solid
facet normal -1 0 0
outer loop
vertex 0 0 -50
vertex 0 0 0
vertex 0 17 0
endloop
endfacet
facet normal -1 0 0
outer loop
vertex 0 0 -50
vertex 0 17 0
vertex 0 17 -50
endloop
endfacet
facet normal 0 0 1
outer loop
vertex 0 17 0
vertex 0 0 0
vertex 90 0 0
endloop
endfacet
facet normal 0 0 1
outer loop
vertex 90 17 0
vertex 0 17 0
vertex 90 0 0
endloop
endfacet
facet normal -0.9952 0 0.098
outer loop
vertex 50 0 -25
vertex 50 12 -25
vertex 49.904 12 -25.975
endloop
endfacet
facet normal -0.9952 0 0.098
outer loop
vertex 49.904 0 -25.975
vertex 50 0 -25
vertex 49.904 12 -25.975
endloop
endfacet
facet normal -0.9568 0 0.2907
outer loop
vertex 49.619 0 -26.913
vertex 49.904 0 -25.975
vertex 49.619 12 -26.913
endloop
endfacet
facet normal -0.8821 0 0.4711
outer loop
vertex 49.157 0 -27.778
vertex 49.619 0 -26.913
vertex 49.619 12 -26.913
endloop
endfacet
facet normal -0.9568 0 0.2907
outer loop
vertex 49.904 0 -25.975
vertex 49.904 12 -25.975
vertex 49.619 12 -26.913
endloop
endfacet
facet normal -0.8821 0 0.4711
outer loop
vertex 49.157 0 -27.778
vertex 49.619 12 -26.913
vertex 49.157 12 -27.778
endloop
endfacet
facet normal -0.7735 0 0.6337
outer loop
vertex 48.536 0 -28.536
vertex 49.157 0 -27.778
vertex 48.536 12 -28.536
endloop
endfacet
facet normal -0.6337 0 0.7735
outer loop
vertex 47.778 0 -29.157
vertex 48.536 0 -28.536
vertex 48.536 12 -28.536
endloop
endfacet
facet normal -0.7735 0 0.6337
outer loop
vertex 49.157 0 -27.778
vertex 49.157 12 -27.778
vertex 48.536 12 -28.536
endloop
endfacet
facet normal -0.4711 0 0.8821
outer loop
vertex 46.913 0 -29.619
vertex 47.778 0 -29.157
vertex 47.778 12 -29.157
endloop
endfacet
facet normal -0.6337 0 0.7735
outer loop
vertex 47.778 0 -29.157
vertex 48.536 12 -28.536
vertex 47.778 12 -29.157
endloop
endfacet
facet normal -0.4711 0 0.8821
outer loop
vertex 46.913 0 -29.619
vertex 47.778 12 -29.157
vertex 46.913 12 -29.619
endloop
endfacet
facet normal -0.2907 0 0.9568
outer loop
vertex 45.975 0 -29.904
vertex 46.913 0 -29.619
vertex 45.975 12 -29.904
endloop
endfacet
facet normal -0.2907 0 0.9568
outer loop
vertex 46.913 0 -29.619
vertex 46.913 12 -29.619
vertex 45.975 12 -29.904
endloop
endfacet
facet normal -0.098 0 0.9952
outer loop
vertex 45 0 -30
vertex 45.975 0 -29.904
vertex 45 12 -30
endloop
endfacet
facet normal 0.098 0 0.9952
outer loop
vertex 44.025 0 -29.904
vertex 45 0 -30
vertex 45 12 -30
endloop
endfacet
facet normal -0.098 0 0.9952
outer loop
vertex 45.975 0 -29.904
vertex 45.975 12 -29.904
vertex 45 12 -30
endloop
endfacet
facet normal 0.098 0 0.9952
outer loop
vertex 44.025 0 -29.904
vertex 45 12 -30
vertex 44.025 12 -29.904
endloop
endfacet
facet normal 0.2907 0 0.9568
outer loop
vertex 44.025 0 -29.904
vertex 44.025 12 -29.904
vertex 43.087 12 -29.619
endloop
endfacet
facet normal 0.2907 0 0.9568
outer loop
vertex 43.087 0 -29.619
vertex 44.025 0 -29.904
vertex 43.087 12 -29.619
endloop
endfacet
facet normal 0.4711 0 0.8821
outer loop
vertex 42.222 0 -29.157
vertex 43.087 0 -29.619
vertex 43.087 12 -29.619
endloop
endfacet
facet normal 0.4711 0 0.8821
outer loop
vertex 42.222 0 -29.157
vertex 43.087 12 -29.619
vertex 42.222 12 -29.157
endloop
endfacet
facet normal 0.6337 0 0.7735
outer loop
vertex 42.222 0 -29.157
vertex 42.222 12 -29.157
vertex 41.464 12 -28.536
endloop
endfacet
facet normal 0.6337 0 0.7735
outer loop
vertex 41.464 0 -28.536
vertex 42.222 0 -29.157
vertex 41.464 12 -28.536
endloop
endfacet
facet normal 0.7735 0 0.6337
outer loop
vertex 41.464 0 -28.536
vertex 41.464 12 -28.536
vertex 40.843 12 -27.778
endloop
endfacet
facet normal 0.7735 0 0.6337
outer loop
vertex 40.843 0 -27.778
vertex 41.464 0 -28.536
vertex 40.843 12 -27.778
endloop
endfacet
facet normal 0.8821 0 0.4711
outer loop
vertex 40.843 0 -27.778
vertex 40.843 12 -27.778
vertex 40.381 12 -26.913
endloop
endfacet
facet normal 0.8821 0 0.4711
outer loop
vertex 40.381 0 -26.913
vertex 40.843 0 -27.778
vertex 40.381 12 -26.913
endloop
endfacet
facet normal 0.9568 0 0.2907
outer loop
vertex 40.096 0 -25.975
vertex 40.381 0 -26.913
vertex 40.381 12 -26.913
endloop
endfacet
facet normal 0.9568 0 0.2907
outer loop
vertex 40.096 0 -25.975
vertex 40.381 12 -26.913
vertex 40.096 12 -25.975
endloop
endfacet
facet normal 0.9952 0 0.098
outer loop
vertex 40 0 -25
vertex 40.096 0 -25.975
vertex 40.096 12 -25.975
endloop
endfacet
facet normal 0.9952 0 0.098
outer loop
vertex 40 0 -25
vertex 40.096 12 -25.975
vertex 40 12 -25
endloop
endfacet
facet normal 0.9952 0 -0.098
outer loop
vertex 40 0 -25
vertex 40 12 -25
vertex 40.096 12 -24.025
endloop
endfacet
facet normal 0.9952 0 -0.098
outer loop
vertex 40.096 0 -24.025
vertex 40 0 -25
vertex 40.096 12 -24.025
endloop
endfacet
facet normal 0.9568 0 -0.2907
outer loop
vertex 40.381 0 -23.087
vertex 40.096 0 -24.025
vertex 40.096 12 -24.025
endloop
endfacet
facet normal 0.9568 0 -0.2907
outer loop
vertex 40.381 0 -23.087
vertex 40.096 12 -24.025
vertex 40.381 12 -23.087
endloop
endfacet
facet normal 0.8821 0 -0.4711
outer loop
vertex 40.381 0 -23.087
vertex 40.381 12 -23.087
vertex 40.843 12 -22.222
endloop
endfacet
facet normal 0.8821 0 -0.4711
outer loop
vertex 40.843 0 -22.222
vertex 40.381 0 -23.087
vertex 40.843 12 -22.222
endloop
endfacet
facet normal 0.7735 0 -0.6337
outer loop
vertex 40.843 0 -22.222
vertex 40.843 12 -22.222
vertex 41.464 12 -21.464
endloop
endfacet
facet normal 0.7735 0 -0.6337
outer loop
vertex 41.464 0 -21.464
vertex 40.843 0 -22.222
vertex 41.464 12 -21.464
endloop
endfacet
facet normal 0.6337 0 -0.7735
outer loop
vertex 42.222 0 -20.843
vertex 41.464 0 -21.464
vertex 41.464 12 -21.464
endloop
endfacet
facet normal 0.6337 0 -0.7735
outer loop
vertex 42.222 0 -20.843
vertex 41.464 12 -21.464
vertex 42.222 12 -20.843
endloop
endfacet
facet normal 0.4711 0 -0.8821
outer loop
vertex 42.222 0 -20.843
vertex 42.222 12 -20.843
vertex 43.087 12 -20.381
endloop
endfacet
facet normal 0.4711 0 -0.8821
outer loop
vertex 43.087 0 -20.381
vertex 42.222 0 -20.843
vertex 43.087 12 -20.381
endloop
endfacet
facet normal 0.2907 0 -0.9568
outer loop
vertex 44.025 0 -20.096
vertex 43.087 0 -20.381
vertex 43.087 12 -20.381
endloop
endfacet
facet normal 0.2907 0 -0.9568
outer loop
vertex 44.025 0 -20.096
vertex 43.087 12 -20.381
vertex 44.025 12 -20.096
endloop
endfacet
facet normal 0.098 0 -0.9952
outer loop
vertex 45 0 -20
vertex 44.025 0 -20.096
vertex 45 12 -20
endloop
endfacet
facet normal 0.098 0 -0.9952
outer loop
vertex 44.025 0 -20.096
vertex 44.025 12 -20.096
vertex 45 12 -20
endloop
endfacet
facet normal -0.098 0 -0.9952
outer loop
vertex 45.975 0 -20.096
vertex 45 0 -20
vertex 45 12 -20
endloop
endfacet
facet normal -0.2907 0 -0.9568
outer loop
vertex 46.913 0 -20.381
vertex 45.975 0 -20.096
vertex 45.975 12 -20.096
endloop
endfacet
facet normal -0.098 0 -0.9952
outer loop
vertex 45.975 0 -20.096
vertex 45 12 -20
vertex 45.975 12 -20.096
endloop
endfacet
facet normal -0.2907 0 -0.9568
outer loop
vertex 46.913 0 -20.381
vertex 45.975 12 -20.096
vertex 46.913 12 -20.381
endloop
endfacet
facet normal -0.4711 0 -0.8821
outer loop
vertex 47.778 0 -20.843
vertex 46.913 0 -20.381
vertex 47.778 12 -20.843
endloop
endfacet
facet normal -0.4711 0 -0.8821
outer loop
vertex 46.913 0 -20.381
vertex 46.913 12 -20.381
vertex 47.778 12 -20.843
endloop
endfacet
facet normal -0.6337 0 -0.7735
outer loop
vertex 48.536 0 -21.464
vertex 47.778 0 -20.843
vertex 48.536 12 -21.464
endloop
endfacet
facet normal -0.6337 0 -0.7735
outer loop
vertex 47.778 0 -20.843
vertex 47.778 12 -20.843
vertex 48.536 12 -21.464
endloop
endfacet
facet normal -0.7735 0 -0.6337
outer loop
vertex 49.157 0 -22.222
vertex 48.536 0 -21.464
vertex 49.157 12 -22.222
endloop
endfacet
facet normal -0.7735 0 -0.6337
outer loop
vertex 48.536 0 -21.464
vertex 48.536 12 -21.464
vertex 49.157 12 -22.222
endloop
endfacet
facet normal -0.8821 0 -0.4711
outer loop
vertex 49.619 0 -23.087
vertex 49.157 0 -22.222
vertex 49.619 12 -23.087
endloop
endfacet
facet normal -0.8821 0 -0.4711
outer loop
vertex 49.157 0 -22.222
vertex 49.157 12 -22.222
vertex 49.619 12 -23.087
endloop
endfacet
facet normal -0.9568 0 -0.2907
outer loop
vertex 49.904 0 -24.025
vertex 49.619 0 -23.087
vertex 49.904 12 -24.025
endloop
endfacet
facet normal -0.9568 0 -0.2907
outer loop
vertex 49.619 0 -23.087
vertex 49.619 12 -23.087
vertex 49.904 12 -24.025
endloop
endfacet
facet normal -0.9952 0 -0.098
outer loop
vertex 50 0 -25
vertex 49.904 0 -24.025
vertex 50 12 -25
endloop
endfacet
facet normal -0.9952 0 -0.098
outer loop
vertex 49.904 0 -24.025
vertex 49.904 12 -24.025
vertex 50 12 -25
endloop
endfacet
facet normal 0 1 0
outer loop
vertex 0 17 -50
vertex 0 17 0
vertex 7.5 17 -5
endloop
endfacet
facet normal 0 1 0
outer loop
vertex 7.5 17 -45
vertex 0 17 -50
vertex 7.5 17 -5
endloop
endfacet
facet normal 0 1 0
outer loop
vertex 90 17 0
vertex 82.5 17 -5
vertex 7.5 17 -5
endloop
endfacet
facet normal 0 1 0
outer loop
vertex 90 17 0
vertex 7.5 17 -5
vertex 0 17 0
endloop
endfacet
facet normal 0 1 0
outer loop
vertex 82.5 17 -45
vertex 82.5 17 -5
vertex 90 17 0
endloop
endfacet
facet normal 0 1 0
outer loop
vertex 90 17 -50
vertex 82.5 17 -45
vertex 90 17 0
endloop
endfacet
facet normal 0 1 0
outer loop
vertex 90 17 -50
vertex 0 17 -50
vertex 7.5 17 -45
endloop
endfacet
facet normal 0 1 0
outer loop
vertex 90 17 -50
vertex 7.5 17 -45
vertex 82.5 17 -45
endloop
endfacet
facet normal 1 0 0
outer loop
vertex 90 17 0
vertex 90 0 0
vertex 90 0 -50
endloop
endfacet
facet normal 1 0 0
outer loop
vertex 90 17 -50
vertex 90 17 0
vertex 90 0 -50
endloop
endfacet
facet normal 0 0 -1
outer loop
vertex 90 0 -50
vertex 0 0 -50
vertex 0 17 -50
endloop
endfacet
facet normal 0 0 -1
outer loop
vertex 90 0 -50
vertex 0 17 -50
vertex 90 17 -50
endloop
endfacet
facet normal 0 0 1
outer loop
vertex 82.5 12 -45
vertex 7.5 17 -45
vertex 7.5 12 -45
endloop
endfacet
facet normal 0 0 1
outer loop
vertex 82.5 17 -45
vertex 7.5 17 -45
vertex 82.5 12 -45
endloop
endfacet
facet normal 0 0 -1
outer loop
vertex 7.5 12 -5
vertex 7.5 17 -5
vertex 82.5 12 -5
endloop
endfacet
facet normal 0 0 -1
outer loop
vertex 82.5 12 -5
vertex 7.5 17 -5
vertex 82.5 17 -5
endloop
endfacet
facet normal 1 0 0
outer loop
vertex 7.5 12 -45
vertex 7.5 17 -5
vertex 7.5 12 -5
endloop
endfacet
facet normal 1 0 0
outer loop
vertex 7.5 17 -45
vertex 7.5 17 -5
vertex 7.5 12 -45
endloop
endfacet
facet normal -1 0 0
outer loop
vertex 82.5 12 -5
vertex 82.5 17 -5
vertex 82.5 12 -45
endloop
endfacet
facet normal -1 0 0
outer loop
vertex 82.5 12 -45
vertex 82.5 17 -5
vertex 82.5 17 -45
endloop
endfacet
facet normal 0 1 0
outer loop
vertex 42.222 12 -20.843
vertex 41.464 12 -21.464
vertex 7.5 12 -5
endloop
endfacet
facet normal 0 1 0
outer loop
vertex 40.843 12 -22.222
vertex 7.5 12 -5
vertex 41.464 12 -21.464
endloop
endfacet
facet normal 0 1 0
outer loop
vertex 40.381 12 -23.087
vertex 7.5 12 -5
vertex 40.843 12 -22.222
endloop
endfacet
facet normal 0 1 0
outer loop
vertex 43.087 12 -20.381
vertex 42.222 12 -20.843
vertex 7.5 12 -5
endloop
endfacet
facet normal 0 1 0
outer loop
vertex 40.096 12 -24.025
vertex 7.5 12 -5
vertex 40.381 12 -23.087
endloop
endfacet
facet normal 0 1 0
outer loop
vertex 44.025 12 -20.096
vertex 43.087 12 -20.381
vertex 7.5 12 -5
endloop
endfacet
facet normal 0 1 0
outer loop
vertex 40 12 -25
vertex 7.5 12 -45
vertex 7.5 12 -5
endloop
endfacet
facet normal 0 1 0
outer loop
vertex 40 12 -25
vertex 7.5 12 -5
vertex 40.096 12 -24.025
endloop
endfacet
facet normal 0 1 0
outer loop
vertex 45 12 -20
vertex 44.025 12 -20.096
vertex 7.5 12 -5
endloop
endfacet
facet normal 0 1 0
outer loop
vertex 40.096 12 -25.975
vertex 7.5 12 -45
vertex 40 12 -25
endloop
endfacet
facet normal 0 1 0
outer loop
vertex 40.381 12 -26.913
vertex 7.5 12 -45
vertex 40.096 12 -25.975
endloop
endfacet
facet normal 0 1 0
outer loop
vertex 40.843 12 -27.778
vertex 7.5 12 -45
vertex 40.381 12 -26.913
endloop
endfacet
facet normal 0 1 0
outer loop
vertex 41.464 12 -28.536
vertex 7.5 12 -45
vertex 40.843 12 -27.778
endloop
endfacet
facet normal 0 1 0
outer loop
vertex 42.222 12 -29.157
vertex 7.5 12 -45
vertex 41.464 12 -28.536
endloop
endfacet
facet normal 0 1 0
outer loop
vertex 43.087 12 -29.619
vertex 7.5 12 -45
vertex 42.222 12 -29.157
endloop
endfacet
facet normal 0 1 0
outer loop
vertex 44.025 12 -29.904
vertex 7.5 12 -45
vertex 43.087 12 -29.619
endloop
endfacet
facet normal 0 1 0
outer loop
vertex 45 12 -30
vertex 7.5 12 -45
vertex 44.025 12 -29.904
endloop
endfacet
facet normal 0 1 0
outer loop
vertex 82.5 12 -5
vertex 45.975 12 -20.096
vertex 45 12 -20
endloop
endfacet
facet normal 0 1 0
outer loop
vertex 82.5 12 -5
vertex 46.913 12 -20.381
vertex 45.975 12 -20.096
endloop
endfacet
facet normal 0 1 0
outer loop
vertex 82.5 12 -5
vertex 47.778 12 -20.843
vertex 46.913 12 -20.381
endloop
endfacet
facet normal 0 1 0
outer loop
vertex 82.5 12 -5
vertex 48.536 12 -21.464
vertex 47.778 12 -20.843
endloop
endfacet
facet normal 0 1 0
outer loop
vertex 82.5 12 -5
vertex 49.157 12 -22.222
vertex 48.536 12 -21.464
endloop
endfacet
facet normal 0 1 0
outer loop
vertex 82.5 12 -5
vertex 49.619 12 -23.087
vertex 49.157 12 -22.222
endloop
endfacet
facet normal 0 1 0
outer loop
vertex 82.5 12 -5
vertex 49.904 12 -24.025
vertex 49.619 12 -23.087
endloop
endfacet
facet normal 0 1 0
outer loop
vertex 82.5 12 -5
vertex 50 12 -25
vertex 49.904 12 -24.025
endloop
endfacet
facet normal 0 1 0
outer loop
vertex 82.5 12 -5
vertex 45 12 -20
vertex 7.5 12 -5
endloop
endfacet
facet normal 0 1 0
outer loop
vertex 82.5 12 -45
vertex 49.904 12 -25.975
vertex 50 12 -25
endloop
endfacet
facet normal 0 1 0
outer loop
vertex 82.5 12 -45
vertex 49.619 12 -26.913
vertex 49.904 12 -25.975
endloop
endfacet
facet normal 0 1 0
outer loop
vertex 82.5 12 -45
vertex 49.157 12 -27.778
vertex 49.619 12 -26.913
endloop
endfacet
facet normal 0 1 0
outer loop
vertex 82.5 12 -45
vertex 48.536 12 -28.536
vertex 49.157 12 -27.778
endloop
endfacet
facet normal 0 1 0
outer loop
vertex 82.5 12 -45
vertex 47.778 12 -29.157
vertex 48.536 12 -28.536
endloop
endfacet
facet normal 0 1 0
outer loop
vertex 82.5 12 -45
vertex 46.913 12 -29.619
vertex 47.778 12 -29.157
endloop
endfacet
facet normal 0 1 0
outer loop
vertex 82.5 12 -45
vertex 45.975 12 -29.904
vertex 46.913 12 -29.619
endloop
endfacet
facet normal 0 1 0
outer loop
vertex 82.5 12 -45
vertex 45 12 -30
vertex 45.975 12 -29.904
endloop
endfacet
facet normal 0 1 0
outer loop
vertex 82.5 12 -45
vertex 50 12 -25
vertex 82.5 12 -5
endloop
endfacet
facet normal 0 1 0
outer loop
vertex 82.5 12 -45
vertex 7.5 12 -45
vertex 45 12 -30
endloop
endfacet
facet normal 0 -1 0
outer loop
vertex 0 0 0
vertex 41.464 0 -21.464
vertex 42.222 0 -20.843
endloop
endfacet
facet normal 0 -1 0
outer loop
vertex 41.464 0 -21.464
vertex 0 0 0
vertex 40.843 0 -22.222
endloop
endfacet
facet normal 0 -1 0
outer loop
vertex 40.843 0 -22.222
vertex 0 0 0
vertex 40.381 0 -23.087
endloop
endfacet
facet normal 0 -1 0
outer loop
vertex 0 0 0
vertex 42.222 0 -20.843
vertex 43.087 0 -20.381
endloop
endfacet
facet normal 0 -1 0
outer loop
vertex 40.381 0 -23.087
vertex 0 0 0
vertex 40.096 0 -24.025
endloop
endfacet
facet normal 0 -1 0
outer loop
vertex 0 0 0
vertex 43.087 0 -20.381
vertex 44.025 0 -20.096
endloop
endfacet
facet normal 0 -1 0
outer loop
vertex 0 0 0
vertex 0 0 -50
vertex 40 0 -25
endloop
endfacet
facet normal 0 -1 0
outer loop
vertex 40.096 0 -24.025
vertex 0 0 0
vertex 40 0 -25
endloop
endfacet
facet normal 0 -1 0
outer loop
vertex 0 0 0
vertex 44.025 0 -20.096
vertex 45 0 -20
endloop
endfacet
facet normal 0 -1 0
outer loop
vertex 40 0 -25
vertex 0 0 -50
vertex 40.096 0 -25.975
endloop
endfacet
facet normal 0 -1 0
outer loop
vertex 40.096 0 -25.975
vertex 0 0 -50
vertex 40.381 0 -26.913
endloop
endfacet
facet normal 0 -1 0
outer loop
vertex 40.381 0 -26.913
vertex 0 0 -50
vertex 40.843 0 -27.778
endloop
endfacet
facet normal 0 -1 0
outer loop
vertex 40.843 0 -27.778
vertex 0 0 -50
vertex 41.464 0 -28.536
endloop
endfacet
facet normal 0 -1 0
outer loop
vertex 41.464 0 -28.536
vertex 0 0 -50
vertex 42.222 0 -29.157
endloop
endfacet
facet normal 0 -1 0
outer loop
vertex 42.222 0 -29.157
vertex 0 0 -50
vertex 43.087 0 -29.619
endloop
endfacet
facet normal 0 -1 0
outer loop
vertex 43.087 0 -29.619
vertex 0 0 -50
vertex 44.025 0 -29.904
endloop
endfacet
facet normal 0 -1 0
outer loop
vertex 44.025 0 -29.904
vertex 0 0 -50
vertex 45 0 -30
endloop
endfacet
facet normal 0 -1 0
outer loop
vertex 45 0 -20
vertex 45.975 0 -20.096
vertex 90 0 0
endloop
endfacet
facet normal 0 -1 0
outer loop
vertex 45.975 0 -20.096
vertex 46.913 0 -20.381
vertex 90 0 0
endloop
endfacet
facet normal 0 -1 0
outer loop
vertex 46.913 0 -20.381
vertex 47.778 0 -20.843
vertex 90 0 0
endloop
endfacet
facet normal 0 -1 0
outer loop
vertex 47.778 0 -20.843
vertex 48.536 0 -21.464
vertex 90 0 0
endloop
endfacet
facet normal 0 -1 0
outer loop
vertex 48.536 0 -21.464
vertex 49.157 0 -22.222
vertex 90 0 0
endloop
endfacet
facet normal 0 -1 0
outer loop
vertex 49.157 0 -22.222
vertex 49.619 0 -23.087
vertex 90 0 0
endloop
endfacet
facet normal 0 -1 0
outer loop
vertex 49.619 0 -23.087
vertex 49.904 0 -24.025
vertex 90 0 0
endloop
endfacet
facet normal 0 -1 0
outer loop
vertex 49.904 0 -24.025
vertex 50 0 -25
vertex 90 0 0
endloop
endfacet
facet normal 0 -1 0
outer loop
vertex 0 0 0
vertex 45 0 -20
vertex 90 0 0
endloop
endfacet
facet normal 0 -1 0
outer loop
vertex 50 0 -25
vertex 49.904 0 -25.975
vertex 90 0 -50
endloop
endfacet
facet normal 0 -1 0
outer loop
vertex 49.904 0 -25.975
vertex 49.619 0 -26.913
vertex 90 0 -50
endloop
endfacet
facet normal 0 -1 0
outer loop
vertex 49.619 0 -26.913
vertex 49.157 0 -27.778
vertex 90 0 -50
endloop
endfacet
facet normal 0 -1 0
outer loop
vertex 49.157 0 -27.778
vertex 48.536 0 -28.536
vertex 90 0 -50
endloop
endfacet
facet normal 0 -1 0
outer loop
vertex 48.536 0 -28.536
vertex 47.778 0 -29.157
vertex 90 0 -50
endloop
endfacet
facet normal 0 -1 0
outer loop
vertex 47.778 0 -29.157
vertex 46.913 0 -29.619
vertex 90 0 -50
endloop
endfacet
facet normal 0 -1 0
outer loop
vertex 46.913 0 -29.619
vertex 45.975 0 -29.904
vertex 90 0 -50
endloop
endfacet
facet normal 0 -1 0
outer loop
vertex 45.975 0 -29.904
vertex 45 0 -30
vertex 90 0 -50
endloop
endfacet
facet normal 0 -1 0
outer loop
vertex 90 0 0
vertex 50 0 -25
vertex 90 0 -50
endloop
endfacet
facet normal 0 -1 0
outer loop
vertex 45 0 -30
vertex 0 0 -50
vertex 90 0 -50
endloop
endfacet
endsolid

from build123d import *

# Parameters (mm, degrees)
SKETCH1_W           = 90
SKETCH1_H           = 50
BOSS_EXTRUDE1_DEPTH = 17
SKETCH2_W           = 75
SKETCH2_H           = 40
CUT_EXTRUDE1_DEPTH  = 5
SKETCH3_R           = 5
CUT_EXTRUDE2_DEPTH  = 13


with BuildPart() as part:
    # Sketch1 → Boss-Extrude1 (new body)
    with BuildSketch(Plane(origin=(0, 0, 0), x_dir=(1, 0, 0), z_dir=(0, 1, 0))):
        with Locations((45, 25)):
            Rectangle(SKETCH1_W, SKETCH1_H)
    extrude(amount=BOSS_EXTRUDE1_DEPTH)

    # Sketch2 → Cut-Extrude1 (cut)
    with BuildSketch(Plane(origin=(0, 17, 0), x_dir=(1, 0, 0), z_dir=(0, 1, 0))):
        with Locations((45, 25)):
            Rectangle(SKETCH2_W, SKETCH2_H)
    extrude(amount=-CUT_EXTRUDE1_DEPTH, mode=Mode.SUBTRACT)

    # Sketch3 → Cut-Extrude2 (cut, through all)
    with BuildSketch(Plane(origin=(0, 12, 0), x_dir=(1, 0, 0), z_dir=(0, 1, 0))):
        with Locations((45, 25)):
            Circle(SKETCH3_R)
    extrude(amount=-CUT_EXTRUDE2_DEPTH, mode=Mode.SUBTRACT)


solid = part.part
